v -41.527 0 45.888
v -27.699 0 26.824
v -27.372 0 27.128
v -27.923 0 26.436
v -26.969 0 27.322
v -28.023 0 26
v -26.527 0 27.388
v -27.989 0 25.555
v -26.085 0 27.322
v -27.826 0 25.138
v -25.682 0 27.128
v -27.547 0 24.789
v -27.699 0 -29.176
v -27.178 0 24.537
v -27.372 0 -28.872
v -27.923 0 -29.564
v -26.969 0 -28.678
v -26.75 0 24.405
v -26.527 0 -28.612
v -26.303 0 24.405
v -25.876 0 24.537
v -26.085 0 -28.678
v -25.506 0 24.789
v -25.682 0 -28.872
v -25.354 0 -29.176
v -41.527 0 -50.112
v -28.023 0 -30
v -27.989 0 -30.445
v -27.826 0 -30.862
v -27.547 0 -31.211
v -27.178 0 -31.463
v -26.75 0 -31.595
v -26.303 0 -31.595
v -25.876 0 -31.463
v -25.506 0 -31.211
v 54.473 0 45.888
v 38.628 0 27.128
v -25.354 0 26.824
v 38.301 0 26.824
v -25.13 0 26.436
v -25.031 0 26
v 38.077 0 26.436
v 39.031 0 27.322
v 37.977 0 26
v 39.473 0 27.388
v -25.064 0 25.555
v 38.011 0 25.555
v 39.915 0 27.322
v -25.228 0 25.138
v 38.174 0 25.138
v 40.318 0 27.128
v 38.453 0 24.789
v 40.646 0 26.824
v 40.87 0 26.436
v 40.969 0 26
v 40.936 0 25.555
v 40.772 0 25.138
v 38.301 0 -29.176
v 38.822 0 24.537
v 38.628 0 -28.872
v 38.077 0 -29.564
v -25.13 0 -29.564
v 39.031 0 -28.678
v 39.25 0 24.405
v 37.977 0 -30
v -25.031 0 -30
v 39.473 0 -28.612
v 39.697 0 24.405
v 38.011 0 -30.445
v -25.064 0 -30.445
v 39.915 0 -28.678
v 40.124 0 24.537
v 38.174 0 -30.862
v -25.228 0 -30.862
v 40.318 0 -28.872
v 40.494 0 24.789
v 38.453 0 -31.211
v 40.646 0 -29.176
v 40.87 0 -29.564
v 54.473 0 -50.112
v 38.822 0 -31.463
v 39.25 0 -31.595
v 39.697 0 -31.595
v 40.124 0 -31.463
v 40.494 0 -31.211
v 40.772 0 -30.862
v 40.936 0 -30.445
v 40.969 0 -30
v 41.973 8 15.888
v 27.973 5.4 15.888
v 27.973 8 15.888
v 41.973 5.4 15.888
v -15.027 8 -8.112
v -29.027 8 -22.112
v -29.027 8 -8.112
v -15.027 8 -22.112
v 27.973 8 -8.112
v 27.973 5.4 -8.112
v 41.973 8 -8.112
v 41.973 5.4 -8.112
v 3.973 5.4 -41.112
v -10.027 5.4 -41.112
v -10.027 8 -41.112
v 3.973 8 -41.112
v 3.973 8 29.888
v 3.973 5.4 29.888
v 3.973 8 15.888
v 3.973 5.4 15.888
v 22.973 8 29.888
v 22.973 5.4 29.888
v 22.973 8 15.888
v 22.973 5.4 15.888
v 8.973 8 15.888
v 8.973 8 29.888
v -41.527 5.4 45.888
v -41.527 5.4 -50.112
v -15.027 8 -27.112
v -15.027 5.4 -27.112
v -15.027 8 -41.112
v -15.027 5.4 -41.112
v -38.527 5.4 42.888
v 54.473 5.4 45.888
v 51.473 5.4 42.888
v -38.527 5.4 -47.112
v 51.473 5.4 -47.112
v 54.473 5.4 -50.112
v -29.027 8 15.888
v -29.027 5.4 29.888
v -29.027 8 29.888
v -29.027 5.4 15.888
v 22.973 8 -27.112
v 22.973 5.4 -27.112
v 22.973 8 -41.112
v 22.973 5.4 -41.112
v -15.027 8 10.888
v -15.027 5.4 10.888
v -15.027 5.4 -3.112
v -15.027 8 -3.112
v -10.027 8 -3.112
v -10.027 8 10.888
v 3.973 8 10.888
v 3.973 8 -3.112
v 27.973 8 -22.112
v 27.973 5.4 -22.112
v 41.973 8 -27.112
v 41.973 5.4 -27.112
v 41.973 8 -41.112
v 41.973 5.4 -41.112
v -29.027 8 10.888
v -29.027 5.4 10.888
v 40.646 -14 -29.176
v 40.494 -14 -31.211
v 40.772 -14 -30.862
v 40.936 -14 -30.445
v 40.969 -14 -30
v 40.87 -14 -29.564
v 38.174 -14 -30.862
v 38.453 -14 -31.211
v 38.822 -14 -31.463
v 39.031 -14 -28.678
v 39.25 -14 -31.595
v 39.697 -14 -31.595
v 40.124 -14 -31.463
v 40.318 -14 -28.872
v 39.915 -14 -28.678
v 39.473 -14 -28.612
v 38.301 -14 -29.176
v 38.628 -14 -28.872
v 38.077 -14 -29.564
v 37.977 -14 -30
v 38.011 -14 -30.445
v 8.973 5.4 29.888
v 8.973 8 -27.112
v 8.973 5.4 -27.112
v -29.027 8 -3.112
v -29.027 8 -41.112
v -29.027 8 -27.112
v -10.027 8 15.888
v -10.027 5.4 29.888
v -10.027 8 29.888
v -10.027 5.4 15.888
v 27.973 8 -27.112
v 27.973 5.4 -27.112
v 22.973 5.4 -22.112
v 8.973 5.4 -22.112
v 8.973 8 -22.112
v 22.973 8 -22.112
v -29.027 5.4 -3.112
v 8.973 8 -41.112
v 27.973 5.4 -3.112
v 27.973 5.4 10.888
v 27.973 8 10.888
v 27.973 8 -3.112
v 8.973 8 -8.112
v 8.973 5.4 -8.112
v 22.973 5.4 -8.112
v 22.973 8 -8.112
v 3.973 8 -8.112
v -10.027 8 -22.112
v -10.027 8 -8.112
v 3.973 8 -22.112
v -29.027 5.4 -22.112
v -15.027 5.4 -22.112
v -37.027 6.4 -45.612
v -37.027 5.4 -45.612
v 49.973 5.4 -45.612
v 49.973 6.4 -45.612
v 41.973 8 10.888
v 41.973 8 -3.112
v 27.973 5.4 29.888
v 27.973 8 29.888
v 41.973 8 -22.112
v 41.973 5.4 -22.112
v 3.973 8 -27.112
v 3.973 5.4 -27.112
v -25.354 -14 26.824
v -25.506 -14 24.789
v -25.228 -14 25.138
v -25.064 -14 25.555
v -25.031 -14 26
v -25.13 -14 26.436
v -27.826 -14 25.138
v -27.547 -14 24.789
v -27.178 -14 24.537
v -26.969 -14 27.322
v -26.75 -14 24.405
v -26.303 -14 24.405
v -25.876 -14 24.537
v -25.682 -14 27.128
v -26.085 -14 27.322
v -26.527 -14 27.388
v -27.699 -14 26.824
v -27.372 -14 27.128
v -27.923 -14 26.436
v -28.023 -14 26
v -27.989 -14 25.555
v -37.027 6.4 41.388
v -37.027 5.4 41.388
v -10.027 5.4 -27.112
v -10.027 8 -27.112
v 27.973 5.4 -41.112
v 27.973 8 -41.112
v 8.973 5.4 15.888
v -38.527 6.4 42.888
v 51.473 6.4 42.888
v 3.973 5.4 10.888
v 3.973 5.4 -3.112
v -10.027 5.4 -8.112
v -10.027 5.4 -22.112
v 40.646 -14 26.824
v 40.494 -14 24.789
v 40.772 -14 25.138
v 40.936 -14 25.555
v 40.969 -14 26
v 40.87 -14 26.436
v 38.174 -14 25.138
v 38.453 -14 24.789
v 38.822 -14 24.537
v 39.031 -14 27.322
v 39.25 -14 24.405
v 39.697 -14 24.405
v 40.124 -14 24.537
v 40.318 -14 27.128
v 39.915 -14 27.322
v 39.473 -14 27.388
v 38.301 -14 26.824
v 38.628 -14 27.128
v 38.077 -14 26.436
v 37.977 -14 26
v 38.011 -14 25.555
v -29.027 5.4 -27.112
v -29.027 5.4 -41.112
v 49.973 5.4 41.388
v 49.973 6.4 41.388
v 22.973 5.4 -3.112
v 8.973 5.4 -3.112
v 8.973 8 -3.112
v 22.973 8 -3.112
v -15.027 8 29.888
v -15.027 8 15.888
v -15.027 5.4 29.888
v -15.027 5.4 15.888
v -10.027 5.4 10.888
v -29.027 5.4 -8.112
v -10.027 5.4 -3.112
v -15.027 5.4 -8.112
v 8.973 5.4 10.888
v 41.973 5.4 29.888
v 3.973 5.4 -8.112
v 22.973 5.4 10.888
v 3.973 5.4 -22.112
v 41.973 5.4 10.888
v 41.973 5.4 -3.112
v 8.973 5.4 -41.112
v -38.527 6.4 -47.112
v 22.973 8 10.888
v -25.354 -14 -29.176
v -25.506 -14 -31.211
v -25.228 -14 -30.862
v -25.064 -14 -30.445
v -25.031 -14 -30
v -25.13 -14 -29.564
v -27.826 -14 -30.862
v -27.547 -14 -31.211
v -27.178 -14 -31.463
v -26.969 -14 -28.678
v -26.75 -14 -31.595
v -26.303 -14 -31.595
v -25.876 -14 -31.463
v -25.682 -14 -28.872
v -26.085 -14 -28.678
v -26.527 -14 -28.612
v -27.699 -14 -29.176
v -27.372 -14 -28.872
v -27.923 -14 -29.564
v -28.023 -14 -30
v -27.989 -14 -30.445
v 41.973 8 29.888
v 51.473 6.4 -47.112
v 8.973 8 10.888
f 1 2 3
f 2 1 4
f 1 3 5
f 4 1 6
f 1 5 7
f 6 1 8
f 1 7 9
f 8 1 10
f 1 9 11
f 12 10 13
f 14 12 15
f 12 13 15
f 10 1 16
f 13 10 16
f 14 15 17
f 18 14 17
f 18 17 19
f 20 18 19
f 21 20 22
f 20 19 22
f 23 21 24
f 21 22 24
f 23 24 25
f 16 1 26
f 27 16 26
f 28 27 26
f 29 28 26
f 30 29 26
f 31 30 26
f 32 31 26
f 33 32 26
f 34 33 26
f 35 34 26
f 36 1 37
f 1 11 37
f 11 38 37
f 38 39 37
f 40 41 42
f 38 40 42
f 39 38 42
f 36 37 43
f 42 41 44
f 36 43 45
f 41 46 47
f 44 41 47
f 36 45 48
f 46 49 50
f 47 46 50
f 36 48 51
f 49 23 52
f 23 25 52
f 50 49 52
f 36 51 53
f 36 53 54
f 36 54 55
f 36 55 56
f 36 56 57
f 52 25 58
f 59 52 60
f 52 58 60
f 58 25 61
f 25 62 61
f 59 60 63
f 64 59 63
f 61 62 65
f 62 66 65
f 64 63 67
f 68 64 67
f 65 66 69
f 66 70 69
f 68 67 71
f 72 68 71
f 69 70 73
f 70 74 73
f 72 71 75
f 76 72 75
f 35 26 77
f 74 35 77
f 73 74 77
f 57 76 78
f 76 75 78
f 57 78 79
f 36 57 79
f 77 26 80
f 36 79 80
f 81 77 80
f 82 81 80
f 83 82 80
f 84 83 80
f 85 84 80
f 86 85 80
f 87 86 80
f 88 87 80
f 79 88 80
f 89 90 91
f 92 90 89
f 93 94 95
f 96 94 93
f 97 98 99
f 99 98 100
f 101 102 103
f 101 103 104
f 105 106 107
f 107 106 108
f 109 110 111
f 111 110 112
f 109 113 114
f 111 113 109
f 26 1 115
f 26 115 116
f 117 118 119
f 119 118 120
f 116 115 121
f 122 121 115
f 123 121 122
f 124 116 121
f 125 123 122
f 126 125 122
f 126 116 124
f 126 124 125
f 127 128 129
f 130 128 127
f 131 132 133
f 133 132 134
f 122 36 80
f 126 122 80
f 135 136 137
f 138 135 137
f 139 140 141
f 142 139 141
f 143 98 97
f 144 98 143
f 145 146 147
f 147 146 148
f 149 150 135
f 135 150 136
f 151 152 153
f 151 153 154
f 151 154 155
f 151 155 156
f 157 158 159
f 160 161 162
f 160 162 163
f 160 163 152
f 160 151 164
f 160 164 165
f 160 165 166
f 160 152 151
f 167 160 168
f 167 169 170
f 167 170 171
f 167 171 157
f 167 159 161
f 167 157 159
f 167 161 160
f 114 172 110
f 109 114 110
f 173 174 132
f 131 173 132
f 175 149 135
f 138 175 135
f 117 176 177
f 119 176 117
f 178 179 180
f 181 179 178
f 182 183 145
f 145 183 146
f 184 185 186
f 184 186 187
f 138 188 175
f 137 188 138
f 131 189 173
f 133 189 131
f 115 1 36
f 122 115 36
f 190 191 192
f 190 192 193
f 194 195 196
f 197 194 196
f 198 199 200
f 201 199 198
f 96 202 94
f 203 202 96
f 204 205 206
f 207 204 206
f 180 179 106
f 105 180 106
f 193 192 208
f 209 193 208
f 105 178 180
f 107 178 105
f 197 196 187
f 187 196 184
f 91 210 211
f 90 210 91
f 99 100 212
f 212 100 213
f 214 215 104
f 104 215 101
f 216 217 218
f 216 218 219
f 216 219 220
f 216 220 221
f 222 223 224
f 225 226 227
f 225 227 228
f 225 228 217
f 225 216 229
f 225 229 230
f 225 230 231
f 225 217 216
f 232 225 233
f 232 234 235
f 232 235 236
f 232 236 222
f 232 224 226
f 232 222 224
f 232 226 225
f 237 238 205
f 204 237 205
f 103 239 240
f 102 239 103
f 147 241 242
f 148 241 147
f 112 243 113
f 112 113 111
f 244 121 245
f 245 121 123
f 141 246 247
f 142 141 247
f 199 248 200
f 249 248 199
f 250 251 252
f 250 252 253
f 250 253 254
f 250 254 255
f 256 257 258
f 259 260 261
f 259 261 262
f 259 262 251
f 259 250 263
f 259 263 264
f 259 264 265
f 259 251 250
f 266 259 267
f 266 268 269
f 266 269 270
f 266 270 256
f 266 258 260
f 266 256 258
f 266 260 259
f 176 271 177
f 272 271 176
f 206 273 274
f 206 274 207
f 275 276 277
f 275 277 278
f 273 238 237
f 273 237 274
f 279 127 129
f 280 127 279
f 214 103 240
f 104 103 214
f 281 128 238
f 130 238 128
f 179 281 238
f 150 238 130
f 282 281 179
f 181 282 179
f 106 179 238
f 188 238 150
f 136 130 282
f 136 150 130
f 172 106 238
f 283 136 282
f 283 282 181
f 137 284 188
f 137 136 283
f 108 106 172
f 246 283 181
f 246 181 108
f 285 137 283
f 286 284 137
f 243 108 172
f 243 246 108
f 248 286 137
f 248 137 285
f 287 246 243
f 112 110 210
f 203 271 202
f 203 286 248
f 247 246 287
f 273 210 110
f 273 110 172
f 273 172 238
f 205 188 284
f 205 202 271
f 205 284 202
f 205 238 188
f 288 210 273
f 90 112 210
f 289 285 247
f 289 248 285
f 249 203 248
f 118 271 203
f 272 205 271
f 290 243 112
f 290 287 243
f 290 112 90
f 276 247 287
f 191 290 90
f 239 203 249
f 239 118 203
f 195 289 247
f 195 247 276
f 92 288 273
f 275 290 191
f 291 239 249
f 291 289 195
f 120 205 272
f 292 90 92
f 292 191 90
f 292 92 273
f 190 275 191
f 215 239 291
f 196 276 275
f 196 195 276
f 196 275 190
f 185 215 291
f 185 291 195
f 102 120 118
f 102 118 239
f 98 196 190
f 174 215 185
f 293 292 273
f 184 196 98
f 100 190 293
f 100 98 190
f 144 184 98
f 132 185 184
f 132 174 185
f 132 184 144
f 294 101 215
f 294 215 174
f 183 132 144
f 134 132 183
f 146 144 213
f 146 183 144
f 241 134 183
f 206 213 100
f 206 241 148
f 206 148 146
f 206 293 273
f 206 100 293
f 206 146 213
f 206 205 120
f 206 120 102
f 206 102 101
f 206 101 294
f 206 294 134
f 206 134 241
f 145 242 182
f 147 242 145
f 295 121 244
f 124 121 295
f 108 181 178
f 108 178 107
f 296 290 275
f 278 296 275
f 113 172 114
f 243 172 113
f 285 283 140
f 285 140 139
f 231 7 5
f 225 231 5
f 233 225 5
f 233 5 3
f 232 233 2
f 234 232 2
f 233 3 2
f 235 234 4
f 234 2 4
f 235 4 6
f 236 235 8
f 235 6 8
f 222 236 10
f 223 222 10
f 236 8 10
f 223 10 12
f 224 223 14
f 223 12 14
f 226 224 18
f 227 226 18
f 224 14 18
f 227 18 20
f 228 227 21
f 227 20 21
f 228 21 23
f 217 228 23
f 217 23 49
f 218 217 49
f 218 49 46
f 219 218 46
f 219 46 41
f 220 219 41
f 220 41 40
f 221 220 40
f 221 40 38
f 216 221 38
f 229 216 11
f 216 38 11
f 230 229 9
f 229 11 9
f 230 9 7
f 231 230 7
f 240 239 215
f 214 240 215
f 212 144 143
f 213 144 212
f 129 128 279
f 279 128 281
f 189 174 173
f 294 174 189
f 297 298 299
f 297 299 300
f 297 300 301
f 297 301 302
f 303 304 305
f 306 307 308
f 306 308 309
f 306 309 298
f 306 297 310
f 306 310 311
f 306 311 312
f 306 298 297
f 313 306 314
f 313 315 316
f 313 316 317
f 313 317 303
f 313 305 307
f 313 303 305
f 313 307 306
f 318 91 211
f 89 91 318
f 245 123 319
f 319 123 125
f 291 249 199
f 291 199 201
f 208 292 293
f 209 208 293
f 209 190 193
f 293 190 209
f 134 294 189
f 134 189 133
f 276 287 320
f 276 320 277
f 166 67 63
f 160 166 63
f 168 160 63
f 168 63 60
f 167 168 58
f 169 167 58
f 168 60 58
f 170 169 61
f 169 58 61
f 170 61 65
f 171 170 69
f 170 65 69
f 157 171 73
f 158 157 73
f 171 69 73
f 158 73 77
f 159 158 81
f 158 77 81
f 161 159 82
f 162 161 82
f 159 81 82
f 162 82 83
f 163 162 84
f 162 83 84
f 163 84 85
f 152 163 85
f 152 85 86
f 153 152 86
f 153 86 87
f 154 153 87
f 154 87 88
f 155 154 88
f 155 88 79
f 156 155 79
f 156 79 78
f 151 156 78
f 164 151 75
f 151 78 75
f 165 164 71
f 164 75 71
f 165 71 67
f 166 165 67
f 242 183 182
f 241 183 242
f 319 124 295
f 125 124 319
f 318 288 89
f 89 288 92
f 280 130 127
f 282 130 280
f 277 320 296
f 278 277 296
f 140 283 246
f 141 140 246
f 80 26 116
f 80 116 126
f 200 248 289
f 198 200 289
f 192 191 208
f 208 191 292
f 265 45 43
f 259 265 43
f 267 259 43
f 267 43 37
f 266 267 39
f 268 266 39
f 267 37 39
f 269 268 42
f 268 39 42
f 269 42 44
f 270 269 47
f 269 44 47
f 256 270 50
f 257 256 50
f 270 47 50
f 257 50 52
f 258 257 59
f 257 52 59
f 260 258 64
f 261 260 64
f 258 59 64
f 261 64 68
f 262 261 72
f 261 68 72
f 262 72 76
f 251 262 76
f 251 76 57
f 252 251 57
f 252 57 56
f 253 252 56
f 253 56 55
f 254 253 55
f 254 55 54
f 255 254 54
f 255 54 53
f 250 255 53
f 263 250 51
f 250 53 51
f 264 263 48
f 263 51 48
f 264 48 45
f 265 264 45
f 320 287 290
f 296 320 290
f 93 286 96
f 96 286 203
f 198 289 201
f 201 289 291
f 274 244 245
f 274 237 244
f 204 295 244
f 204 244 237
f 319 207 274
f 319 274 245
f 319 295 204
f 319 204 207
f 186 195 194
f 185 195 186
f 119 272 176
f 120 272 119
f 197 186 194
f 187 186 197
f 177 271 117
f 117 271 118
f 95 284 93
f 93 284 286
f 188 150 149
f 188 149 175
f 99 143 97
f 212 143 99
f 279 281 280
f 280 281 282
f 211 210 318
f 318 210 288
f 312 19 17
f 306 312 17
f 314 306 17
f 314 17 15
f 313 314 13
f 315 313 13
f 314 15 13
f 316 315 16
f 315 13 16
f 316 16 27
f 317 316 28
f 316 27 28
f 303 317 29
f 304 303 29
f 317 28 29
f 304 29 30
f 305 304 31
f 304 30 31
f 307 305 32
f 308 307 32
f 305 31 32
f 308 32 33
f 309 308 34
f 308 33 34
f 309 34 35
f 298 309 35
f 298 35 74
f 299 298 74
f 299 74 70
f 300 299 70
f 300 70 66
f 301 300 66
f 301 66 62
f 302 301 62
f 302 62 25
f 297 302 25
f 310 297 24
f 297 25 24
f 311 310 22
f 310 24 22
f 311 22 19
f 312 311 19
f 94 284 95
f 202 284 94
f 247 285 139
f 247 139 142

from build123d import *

# Parameters (mm, degrees)
SKETCH_1_W        = 96
SKETCH_1_H        = 96
EXTRUDE_1_DEPTH   = 5.4
SKETCH_2_W        = 14
SKETCH_2_H        = 14
EXTRUDE_2_DEPTH   = 2.6
SKETCH_4_W        = 90
SKETCH_4_H        = 90
SKETCH_4_W_2      = 87
SKETCH_4_H_2      = 87
EXTRUDE_1_2_DEPTH = 1
SKETCH_5_R        = 1.5
EXTRUDE_3_DEPTH   = 14


with BuildPart() as part:
    # Эскиз1 → Extrude 1 (new body)
    with BuildSketch(Plane(origin=(0, 0, 0), x_dir=(1, 0, 0), z_dir=(0, 1, 0))):
        with Locations((6.473253846, 2.11160233)):
            Rectangle(SKETCH_1_W, SKETCH_1_H)
    extrude(amount=EXTRUDE_1_DEPTH)

    # Эскиз2 → Бобышка-Вытянуть2 (add)
    with BuildSketch(Plane(origin=(0, 5.4, 0), x_dir=(1, 0, 0), z_dir=(0, 1, 0))):
        with Locations((-3.026746154, 34.11160233)):
            Rectangle(SKETCH_2_W, SKETCH_2_H)
        with Locations((-22.026746154, 34.11160233)):
            Rectangle(SKETCH_2_W, SKETCH_2_H)
        with Locations((15.973253846, 34.11160233)):
            Rectangle(SKETCH_2_W, SKETCH_2_H)
        with Locations((34.973253846, 34.11160233)):
            Rectangle(SKETCH_2_W, SKETCH_2_H)
        with Locations((-3.026746154, 15.11160233)):
            Rectangle(SKETCH_2_W, SKETCH_2_H)
        with Locations((-22.026746154, 15.11160233)):
            Rectangle(SKETCH_2_W, SKETCH_2_H)
        with Locations((15.973253846, 15.11160233)):
            Rectangle(SKETCH_2_W, SKETCH_2_H)
        with Locations((34.973253846, 15.11160233)):
            Rectangle(SKETCH_2_W, SKETCH_2_H)
        with Locations((-3.026746154, -3.88839767)):
            Rectangle(SKETCH_2_W, SKETCH_2_H)
        with Locations((-22.026746154, -3.88839767)):
            Rectangle(SKETCH_2_W, SKETCH_2_H)
        with Locations((15.973253846, -3.88839767)):
            Rectangle(SKETCH_2_W, SKETCH_2_H)
        with Locations((34.973253846, -3.88839767)):
            Rectangle(SKETCH_2_W, SKETCH_2_H)
        with Locations((-3.026746154, -22.88839767)):
            Rectangle(SKETCH_2_W, SKETCH_2_H)
        with Locations((-22.026746154, -22.88839767)):
            Rectangle(SKETCH_2_W, SKETCH_2_H)
        with Locations((15.973253846, -22.88839767)):
            Rectangle(SKETCH_2_W, SKETCH_2_H)
        with Locations((34.973253846, -22.88839767)):
            Rectangle(SKETCH_2_W, SKETCH_2_H)
    extrude(amount=EXTRUDE_2_DEPTH)

    # Эскиз4 → Extrude 1 2 (add)
    with BuildSketch(Plane(origin=(0, 5.4, 0), x_dir=(1, 0, 0), z_dir=(0, 1, 0))):
        with Locations((6.473253846, 2.11160233)):
            Rectangle(SKETCH_4_W, SKETCH_4_H)
        with Locations((6.473253846, 2.11160233)):
            Rectangle(SKETCH_4_W_2, SKETCH_4_H_2, mode=Mode.SUBTRACT)
    extrude(amount=EXTRUDE_1_2_DEPTH)

    # Эскиз5 → Бобышка-Вытянуть3 (add)
    with BuildSketch(Plane.XZ):
        with Locations(Location((39.473253846, 25.88839767, 0), (0, 0, 90))):
            Circle(SKETCH_5_R)
        with Locations(Location((-26.526746154, 25.88839767, 0), (0, 0, 90))):
            Circle(SKETCH_5_R)
        with Locations(Location((-26.526746154, -30.11160233, 0), (0, 0, 90))):
            Circle(SKETCH_5_R)
        with Locations(Location((39.473253846, -30.11160233, 0), (0, 0, 90))):
            Circle(SKETCH_5_R)
    extrude(amount=EXTRUDE_3_DEPTH)


solid = part.part
